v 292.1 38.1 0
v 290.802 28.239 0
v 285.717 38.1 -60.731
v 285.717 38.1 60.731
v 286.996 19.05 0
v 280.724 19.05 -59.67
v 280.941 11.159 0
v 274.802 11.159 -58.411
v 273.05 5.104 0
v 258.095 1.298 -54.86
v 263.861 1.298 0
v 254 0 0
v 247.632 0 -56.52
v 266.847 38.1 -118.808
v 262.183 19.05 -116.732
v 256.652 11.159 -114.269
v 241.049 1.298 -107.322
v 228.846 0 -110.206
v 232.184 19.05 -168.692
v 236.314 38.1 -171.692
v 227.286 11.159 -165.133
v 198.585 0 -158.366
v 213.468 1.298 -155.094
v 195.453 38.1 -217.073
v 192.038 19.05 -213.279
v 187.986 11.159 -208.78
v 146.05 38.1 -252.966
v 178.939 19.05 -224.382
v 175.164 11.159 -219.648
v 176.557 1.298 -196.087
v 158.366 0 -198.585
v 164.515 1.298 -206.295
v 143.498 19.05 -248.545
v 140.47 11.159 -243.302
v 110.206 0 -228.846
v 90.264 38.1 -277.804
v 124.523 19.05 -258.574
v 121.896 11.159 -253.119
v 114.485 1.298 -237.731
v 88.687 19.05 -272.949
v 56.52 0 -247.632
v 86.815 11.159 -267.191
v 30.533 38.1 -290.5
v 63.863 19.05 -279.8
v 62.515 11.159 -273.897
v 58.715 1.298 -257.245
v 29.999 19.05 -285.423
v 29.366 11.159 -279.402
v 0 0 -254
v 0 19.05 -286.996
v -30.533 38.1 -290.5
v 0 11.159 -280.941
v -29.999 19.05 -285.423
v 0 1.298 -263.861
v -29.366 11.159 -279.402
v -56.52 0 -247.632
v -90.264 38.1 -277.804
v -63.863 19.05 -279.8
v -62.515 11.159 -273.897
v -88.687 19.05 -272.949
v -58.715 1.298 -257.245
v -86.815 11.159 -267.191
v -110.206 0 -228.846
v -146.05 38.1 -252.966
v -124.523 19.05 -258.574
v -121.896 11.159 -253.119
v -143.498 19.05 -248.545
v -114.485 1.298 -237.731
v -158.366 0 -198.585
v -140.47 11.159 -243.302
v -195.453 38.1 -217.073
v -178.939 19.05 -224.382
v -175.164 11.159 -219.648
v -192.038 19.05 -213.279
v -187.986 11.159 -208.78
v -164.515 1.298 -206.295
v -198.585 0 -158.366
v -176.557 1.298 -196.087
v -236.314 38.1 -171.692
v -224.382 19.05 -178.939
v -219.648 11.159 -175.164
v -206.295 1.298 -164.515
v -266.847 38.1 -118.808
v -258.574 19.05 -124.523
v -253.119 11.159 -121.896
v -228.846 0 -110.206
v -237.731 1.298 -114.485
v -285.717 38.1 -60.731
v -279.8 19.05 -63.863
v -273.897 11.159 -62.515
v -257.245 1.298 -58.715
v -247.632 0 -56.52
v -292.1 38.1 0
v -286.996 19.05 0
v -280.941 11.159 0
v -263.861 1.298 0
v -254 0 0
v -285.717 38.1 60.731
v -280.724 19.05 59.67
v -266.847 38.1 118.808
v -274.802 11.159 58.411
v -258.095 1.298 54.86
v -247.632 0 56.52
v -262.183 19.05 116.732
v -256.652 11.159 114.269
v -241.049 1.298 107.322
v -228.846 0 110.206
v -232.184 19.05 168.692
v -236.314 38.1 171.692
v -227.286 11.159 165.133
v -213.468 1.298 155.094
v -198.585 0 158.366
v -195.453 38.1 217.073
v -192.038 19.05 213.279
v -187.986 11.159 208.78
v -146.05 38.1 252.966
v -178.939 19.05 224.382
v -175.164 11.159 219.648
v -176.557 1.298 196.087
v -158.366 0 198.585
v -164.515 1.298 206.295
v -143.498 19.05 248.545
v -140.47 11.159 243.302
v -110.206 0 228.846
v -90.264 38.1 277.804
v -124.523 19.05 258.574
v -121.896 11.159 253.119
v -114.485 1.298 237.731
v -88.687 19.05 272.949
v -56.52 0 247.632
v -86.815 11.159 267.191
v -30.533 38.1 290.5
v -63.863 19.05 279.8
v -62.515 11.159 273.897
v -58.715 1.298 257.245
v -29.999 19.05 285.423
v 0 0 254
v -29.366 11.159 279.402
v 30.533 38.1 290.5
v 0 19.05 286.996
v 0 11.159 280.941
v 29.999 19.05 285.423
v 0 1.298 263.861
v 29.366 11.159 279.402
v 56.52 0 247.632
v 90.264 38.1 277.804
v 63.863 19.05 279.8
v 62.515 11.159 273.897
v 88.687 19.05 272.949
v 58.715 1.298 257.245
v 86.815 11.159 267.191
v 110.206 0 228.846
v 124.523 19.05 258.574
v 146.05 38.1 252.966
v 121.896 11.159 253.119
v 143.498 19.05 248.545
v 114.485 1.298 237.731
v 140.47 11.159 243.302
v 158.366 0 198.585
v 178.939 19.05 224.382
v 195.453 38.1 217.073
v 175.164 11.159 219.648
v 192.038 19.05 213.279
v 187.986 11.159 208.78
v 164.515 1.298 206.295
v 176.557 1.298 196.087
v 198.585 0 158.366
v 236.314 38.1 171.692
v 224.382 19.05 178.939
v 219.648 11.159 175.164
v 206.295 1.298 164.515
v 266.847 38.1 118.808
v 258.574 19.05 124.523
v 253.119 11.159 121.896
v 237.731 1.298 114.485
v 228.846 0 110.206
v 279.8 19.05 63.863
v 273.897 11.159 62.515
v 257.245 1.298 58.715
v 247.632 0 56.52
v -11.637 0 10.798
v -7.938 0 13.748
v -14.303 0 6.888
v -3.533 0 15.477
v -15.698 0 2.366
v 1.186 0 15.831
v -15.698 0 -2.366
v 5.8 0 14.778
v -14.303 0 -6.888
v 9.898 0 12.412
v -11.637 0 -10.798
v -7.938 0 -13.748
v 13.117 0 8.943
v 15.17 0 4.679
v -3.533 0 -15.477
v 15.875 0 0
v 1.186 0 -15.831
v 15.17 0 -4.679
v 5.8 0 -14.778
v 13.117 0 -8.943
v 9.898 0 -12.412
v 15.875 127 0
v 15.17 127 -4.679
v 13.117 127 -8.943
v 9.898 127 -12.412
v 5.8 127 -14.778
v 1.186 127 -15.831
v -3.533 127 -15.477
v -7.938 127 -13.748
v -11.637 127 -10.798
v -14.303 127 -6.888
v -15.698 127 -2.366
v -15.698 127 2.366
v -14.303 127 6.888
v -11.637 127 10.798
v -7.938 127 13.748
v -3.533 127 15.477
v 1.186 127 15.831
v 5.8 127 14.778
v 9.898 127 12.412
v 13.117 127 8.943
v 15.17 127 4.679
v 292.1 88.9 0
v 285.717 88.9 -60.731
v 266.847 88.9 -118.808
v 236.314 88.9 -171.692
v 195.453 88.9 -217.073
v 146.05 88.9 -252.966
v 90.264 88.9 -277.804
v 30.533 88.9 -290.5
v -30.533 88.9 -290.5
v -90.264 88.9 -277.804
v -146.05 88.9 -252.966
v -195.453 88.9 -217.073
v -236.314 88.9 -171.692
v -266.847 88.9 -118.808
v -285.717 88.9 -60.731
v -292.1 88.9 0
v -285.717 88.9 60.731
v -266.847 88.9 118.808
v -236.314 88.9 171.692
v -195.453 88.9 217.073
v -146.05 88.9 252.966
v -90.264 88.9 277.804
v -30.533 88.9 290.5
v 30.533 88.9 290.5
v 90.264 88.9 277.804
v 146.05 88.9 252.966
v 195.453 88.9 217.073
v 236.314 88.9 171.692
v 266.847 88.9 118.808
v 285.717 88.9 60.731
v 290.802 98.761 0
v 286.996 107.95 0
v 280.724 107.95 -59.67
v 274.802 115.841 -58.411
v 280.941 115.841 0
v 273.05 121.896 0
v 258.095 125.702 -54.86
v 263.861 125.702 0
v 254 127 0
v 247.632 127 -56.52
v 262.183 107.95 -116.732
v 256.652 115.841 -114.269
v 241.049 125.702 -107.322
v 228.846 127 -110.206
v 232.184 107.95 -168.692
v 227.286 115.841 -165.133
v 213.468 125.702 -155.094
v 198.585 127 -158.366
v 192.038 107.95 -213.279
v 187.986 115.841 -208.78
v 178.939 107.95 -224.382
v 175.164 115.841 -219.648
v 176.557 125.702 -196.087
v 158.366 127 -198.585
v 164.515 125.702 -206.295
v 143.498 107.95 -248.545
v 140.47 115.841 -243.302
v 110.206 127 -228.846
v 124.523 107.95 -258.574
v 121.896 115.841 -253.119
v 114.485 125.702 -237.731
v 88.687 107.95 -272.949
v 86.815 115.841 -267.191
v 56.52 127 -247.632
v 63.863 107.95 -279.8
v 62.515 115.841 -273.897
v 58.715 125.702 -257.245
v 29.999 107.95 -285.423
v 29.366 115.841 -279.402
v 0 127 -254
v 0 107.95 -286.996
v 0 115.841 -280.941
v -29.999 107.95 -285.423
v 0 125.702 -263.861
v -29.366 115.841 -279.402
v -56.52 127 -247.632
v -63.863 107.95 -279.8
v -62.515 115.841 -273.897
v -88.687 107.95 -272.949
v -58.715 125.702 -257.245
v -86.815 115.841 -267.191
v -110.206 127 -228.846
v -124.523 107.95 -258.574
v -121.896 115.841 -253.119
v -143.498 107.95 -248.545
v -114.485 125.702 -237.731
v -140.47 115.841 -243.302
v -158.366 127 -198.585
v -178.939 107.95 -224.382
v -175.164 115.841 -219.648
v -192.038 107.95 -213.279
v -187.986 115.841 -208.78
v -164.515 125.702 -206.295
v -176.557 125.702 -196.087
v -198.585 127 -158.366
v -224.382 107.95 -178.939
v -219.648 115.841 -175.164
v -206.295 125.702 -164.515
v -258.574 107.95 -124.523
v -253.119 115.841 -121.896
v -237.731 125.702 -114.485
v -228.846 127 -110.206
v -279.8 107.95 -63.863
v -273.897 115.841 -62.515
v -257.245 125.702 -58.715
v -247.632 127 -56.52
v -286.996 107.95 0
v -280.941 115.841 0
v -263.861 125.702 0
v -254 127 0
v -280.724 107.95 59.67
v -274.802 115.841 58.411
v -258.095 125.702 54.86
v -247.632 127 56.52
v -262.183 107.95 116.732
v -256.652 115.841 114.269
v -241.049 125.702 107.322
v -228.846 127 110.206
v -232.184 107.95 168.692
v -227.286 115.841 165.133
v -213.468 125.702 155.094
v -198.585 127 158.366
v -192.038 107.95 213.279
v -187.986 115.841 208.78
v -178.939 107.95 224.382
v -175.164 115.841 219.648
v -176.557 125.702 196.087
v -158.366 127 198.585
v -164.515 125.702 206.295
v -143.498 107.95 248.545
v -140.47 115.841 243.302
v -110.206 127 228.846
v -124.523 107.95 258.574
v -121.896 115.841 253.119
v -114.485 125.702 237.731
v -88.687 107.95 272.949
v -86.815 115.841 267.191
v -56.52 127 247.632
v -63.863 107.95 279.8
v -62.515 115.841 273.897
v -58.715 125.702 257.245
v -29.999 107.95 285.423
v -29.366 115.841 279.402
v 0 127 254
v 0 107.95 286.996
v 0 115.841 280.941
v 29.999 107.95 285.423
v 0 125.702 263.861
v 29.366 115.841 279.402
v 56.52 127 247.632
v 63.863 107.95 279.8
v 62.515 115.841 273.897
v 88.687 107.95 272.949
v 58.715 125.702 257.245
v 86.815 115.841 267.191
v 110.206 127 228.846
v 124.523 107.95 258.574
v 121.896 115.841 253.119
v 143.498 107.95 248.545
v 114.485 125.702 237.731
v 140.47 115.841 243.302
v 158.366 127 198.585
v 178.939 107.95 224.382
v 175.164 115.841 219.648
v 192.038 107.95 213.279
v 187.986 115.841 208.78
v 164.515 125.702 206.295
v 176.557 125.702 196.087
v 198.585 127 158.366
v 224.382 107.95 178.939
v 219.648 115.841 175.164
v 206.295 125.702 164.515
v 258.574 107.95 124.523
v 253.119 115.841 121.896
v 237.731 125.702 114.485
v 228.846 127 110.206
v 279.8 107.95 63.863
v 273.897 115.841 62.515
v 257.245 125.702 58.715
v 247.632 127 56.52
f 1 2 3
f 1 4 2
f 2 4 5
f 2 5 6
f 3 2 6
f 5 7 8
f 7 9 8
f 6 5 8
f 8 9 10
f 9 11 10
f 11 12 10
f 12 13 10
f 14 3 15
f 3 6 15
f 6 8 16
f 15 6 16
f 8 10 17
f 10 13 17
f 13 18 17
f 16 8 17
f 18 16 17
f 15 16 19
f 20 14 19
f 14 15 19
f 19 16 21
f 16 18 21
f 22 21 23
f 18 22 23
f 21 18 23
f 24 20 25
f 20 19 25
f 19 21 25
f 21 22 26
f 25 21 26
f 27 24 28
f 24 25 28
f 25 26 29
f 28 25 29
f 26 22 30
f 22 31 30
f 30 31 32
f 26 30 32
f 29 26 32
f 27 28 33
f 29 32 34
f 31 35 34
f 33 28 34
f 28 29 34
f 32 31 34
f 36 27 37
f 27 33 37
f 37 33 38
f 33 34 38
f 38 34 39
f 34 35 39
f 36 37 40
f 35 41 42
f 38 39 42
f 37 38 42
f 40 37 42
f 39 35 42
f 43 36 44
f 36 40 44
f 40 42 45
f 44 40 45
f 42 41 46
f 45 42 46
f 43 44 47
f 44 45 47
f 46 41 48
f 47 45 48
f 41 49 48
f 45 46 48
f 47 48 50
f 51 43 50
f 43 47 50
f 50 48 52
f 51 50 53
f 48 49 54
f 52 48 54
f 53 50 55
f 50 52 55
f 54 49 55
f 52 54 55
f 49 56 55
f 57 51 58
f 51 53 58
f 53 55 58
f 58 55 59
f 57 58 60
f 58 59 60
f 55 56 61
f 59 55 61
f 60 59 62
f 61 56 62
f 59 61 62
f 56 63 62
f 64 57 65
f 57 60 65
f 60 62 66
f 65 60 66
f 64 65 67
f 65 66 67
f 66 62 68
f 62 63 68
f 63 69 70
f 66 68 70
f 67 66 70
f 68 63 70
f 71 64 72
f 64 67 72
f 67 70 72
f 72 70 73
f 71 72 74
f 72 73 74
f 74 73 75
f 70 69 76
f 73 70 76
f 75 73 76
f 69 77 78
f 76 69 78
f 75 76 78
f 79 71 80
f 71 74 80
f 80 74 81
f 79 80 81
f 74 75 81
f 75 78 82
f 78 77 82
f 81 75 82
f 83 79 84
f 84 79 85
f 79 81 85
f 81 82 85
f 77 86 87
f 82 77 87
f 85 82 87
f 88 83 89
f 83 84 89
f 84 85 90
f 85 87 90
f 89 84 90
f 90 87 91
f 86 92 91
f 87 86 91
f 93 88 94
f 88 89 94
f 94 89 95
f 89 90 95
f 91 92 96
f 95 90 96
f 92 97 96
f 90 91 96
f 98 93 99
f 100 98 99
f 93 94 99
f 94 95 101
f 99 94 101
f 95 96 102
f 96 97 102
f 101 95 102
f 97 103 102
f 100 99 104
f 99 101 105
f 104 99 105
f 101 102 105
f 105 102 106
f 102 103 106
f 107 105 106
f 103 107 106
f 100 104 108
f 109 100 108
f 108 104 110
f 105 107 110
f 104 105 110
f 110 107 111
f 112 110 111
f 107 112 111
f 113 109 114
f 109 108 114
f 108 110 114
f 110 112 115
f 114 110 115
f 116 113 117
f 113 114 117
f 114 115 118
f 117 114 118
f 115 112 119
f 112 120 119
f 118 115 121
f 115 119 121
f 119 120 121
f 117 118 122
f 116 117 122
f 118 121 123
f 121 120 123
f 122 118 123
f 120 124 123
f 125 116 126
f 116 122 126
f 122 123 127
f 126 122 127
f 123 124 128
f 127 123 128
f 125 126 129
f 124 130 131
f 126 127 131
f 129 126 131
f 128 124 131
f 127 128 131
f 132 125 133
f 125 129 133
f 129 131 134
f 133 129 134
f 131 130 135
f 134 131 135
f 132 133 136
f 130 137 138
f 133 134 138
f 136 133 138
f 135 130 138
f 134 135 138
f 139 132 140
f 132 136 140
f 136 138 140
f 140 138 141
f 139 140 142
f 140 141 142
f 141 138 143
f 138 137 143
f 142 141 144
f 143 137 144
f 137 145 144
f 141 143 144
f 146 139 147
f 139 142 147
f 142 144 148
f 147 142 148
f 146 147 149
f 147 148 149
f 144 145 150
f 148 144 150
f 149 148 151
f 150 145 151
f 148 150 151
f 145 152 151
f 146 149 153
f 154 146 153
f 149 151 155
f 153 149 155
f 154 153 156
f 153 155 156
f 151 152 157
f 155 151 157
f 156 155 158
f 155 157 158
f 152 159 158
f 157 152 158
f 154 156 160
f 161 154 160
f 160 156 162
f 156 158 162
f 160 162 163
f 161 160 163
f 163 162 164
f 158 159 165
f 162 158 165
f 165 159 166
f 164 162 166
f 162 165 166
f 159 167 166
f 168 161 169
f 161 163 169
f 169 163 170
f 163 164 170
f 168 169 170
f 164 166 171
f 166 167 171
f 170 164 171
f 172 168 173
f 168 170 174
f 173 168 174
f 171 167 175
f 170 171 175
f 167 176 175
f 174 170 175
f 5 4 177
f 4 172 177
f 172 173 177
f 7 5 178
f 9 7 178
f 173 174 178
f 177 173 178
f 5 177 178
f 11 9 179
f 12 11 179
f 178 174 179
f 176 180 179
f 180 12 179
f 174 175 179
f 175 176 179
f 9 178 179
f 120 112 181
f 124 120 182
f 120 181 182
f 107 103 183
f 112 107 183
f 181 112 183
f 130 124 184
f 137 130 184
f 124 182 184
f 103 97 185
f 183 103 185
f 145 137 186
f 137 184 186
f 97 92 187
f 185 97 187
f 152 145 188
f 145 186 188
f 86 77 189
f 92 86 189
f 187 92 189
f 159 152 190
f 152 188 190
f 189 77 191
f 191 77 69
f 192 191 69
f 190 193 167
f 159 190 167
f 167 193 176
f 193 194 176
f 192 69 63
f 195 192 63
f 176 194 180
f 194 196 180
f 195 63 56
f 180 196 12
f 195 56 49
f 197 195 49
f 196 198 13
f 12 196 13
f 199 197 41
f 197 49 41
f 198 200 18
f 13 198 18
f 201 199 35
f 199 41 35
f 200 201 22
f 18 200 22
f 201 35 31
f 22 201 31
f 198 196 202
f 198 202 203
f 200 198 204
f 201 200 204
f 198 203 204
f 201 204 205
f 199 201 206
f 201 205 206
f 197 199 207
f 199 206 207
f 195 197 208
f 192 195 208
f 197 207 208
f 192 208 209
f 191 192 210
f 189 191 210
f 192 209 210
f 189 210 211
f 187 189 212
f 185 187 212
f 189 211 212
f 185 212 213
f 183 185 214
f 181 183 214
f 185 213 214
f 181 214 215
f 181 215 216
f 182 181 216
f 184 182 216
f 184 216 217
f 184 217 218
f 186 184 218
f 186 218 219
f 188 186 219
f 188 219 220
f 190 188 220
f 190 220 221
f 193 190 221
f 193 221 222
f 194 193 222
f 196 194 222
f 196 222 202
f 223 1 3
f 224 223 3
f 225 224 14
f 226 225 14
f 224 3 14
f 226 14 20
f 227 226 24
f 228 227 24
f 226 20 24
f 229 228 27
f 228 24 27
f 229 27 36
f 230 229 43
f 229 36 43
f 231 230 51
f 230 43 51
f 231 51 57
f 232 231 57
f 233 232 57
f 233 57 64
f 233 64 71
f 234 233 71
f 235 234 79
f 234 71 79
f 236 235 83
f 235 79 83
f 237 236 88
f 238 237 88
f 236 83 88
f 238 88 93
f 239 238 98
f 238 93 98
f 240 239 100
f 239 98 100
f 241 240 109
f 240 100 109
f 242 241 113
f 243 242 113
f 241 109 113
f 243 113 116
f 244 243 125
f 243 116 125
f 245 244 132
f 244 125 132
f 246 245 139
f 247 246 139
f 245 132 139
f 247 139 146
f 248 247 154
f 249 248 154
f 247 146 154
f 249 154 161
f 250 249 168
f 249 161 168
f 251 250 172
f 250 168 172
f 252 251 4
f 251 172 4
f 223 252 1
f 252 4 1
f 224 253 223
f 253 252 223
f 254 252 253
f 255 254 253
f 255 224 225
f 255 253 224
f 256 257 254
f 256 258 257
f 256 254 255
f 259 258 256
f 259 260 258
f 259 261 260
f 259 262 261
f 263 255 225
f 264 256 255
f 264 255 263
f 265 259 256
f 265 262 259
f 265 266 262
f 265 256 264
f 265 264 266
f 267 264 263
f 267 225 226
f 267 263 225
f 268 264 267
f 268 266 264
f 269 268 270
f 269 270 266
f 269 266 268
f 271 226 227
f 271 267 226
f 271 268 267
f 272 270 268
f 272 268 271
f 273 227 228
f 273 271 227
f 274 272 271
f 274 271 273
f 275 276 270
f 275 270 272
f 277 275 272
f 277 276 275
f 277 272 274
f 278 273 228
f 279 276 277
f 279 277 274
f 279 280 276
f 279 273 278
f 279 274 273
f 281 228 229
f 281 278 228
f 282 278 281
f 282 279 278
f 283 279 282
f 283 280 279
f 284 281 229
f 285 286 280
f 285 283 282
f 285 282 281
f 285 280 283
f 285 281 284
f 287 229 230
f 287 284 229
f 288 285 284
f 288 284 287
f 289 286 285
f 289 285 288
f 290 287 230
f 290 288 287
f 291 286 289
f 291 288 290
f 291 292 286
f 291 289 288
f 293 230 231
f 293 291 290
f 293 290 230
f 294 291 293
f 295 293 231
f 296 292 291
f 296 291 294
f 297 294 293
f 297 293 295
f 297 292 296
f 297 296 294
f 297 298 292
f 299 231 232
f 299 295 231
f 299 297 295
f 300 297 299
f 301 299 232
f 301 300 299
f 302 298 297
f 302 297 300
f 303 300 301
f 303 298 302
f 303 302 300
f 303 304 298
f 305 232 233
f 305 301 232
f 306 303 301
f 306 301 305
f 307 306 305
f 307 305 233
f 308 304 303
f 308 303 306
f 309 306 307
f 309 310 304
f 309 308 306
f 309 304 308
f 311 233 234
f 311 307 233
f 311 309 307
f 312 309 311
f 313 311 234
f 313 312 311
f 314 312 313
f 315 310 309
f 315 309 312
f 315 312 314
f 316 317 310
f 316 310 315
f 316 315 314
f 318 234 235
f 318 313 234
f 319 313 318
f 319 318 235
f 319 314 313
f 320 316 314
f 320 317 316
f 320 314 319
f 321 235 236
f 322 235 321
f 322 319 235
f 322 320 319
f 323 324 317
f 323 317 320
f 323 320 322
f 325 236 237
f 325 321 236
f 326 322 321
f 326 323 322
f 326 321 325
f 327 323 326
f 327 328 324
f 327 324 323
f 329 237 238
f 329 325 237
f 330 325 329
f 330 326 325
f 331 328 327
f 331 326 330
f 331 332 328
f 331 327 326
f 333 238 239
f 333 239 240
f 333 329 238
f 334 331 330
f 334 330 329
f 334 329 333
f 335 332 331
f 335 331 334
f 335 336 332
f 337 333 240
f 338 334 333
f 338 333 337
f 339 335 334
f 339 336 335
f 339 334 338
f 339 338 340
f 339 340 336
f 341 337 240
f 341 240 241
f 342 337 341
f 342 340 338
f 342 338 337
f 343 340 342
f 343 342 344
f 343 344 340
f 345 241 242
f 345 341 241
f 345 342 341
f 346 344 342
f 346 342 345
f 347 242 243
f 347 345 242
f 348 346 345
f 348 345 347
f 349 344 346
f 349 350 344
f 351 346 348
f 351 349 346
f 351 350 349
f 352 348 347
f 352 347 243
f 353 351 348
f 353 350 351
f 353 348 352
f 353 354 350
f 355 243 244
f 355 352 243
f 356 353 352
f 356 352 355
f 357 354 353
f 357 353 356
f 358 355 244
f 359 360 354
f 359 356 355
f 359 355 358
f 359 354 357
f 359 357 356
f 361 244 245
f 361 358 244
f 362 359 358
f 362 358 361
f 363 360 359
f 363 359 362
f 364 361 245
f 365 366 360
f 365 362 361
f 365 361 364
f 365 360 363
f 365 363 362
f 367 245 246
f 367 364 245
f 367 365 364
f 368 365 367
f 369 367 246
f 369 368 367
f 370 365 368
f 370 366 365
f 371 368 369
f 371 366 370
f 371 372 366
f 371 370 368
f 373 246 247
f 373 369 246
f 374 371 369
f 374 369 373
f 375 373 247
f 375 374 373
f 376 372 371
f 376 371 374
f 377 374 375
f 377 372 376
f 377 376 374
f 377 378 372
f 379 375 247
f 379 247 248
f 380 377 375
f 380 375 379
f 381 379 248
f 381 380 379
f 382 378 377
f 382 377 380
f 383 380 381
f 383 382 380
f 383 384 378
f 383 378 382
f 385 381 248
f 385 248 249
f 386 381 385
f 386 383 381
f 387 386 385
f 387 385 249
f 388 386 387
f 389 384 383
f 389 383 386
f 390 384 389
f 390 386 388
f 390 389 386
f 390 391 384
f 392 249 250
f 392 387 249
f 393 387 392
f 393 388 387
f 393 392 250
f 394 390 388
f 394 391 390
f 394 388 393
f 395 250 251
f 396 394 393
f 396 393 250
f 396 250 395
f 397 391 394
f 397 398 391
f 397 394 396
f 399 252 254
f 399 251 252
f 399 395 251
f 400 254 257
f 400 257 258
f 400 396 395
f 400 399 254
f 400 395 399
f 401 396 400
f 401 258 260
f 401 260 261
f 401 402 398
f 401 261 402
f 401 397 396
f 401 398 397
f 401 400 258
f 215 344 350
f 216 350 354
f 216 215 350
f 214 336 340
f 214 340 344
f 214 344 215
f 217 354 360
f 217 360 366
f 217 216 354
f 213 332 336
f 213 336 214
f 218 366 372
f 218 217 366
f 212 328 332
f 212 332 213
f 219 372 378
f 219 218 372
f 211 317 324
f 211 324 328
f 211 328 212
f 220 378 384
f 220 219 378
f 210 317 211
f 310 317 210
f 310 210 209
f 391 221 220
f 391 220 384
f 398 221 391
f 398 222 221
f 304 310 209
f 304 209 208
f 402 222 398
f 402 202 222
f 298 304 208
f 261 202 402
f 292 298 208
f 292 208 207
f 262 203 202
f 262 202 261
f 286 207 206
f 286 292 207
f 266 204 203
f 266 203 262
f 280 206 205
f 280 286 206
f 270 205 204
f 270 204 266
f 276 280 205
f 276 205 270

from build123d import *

# Parameters (mm, degrees)
SKETCH1_R           = 292.1
BOSS_EXTRUDE1_DEPTH = 127
FILLET1_R           = 38.1
SKETCH2_R           = 15.875
CUT_EXTRUDE1_DEPTH  = 128


with BuildPart() as part:
    # Sketch1 → Boss-Extrude1 (new body)
    with BuildSketch(Plane(origin=(0, 0, 0), x_dir=(1, 0, 0), z_dir=(0, 1, 0))):
        Circle(SKETCH1_R)
    extrude(amount=BOSS_EXTRUDE1_DEPTH)

    # Fillet1
    fillet1_edges = [part.edges().sort_by_distance(p)[0] for p in [
        (-292.1, 0, 0),
        (-292.1, 127, 0),
    ]]
    fillet(fillet1_edges, radius=FILLET1_R)

    # Sketch2 → Cut-Extrude1 (cut, through all)
    with BuildSketch(Plane(origin=(0, 127, 0), x_dir=(1, 0, 0), z_dir=(0, 1, 0))):
        Circle(SKETCH2_R)
    extrude(amount=-CUT_EXTRUDE1_DEPTH, mode=Mode.SUBTRACT)


solid = part.part
